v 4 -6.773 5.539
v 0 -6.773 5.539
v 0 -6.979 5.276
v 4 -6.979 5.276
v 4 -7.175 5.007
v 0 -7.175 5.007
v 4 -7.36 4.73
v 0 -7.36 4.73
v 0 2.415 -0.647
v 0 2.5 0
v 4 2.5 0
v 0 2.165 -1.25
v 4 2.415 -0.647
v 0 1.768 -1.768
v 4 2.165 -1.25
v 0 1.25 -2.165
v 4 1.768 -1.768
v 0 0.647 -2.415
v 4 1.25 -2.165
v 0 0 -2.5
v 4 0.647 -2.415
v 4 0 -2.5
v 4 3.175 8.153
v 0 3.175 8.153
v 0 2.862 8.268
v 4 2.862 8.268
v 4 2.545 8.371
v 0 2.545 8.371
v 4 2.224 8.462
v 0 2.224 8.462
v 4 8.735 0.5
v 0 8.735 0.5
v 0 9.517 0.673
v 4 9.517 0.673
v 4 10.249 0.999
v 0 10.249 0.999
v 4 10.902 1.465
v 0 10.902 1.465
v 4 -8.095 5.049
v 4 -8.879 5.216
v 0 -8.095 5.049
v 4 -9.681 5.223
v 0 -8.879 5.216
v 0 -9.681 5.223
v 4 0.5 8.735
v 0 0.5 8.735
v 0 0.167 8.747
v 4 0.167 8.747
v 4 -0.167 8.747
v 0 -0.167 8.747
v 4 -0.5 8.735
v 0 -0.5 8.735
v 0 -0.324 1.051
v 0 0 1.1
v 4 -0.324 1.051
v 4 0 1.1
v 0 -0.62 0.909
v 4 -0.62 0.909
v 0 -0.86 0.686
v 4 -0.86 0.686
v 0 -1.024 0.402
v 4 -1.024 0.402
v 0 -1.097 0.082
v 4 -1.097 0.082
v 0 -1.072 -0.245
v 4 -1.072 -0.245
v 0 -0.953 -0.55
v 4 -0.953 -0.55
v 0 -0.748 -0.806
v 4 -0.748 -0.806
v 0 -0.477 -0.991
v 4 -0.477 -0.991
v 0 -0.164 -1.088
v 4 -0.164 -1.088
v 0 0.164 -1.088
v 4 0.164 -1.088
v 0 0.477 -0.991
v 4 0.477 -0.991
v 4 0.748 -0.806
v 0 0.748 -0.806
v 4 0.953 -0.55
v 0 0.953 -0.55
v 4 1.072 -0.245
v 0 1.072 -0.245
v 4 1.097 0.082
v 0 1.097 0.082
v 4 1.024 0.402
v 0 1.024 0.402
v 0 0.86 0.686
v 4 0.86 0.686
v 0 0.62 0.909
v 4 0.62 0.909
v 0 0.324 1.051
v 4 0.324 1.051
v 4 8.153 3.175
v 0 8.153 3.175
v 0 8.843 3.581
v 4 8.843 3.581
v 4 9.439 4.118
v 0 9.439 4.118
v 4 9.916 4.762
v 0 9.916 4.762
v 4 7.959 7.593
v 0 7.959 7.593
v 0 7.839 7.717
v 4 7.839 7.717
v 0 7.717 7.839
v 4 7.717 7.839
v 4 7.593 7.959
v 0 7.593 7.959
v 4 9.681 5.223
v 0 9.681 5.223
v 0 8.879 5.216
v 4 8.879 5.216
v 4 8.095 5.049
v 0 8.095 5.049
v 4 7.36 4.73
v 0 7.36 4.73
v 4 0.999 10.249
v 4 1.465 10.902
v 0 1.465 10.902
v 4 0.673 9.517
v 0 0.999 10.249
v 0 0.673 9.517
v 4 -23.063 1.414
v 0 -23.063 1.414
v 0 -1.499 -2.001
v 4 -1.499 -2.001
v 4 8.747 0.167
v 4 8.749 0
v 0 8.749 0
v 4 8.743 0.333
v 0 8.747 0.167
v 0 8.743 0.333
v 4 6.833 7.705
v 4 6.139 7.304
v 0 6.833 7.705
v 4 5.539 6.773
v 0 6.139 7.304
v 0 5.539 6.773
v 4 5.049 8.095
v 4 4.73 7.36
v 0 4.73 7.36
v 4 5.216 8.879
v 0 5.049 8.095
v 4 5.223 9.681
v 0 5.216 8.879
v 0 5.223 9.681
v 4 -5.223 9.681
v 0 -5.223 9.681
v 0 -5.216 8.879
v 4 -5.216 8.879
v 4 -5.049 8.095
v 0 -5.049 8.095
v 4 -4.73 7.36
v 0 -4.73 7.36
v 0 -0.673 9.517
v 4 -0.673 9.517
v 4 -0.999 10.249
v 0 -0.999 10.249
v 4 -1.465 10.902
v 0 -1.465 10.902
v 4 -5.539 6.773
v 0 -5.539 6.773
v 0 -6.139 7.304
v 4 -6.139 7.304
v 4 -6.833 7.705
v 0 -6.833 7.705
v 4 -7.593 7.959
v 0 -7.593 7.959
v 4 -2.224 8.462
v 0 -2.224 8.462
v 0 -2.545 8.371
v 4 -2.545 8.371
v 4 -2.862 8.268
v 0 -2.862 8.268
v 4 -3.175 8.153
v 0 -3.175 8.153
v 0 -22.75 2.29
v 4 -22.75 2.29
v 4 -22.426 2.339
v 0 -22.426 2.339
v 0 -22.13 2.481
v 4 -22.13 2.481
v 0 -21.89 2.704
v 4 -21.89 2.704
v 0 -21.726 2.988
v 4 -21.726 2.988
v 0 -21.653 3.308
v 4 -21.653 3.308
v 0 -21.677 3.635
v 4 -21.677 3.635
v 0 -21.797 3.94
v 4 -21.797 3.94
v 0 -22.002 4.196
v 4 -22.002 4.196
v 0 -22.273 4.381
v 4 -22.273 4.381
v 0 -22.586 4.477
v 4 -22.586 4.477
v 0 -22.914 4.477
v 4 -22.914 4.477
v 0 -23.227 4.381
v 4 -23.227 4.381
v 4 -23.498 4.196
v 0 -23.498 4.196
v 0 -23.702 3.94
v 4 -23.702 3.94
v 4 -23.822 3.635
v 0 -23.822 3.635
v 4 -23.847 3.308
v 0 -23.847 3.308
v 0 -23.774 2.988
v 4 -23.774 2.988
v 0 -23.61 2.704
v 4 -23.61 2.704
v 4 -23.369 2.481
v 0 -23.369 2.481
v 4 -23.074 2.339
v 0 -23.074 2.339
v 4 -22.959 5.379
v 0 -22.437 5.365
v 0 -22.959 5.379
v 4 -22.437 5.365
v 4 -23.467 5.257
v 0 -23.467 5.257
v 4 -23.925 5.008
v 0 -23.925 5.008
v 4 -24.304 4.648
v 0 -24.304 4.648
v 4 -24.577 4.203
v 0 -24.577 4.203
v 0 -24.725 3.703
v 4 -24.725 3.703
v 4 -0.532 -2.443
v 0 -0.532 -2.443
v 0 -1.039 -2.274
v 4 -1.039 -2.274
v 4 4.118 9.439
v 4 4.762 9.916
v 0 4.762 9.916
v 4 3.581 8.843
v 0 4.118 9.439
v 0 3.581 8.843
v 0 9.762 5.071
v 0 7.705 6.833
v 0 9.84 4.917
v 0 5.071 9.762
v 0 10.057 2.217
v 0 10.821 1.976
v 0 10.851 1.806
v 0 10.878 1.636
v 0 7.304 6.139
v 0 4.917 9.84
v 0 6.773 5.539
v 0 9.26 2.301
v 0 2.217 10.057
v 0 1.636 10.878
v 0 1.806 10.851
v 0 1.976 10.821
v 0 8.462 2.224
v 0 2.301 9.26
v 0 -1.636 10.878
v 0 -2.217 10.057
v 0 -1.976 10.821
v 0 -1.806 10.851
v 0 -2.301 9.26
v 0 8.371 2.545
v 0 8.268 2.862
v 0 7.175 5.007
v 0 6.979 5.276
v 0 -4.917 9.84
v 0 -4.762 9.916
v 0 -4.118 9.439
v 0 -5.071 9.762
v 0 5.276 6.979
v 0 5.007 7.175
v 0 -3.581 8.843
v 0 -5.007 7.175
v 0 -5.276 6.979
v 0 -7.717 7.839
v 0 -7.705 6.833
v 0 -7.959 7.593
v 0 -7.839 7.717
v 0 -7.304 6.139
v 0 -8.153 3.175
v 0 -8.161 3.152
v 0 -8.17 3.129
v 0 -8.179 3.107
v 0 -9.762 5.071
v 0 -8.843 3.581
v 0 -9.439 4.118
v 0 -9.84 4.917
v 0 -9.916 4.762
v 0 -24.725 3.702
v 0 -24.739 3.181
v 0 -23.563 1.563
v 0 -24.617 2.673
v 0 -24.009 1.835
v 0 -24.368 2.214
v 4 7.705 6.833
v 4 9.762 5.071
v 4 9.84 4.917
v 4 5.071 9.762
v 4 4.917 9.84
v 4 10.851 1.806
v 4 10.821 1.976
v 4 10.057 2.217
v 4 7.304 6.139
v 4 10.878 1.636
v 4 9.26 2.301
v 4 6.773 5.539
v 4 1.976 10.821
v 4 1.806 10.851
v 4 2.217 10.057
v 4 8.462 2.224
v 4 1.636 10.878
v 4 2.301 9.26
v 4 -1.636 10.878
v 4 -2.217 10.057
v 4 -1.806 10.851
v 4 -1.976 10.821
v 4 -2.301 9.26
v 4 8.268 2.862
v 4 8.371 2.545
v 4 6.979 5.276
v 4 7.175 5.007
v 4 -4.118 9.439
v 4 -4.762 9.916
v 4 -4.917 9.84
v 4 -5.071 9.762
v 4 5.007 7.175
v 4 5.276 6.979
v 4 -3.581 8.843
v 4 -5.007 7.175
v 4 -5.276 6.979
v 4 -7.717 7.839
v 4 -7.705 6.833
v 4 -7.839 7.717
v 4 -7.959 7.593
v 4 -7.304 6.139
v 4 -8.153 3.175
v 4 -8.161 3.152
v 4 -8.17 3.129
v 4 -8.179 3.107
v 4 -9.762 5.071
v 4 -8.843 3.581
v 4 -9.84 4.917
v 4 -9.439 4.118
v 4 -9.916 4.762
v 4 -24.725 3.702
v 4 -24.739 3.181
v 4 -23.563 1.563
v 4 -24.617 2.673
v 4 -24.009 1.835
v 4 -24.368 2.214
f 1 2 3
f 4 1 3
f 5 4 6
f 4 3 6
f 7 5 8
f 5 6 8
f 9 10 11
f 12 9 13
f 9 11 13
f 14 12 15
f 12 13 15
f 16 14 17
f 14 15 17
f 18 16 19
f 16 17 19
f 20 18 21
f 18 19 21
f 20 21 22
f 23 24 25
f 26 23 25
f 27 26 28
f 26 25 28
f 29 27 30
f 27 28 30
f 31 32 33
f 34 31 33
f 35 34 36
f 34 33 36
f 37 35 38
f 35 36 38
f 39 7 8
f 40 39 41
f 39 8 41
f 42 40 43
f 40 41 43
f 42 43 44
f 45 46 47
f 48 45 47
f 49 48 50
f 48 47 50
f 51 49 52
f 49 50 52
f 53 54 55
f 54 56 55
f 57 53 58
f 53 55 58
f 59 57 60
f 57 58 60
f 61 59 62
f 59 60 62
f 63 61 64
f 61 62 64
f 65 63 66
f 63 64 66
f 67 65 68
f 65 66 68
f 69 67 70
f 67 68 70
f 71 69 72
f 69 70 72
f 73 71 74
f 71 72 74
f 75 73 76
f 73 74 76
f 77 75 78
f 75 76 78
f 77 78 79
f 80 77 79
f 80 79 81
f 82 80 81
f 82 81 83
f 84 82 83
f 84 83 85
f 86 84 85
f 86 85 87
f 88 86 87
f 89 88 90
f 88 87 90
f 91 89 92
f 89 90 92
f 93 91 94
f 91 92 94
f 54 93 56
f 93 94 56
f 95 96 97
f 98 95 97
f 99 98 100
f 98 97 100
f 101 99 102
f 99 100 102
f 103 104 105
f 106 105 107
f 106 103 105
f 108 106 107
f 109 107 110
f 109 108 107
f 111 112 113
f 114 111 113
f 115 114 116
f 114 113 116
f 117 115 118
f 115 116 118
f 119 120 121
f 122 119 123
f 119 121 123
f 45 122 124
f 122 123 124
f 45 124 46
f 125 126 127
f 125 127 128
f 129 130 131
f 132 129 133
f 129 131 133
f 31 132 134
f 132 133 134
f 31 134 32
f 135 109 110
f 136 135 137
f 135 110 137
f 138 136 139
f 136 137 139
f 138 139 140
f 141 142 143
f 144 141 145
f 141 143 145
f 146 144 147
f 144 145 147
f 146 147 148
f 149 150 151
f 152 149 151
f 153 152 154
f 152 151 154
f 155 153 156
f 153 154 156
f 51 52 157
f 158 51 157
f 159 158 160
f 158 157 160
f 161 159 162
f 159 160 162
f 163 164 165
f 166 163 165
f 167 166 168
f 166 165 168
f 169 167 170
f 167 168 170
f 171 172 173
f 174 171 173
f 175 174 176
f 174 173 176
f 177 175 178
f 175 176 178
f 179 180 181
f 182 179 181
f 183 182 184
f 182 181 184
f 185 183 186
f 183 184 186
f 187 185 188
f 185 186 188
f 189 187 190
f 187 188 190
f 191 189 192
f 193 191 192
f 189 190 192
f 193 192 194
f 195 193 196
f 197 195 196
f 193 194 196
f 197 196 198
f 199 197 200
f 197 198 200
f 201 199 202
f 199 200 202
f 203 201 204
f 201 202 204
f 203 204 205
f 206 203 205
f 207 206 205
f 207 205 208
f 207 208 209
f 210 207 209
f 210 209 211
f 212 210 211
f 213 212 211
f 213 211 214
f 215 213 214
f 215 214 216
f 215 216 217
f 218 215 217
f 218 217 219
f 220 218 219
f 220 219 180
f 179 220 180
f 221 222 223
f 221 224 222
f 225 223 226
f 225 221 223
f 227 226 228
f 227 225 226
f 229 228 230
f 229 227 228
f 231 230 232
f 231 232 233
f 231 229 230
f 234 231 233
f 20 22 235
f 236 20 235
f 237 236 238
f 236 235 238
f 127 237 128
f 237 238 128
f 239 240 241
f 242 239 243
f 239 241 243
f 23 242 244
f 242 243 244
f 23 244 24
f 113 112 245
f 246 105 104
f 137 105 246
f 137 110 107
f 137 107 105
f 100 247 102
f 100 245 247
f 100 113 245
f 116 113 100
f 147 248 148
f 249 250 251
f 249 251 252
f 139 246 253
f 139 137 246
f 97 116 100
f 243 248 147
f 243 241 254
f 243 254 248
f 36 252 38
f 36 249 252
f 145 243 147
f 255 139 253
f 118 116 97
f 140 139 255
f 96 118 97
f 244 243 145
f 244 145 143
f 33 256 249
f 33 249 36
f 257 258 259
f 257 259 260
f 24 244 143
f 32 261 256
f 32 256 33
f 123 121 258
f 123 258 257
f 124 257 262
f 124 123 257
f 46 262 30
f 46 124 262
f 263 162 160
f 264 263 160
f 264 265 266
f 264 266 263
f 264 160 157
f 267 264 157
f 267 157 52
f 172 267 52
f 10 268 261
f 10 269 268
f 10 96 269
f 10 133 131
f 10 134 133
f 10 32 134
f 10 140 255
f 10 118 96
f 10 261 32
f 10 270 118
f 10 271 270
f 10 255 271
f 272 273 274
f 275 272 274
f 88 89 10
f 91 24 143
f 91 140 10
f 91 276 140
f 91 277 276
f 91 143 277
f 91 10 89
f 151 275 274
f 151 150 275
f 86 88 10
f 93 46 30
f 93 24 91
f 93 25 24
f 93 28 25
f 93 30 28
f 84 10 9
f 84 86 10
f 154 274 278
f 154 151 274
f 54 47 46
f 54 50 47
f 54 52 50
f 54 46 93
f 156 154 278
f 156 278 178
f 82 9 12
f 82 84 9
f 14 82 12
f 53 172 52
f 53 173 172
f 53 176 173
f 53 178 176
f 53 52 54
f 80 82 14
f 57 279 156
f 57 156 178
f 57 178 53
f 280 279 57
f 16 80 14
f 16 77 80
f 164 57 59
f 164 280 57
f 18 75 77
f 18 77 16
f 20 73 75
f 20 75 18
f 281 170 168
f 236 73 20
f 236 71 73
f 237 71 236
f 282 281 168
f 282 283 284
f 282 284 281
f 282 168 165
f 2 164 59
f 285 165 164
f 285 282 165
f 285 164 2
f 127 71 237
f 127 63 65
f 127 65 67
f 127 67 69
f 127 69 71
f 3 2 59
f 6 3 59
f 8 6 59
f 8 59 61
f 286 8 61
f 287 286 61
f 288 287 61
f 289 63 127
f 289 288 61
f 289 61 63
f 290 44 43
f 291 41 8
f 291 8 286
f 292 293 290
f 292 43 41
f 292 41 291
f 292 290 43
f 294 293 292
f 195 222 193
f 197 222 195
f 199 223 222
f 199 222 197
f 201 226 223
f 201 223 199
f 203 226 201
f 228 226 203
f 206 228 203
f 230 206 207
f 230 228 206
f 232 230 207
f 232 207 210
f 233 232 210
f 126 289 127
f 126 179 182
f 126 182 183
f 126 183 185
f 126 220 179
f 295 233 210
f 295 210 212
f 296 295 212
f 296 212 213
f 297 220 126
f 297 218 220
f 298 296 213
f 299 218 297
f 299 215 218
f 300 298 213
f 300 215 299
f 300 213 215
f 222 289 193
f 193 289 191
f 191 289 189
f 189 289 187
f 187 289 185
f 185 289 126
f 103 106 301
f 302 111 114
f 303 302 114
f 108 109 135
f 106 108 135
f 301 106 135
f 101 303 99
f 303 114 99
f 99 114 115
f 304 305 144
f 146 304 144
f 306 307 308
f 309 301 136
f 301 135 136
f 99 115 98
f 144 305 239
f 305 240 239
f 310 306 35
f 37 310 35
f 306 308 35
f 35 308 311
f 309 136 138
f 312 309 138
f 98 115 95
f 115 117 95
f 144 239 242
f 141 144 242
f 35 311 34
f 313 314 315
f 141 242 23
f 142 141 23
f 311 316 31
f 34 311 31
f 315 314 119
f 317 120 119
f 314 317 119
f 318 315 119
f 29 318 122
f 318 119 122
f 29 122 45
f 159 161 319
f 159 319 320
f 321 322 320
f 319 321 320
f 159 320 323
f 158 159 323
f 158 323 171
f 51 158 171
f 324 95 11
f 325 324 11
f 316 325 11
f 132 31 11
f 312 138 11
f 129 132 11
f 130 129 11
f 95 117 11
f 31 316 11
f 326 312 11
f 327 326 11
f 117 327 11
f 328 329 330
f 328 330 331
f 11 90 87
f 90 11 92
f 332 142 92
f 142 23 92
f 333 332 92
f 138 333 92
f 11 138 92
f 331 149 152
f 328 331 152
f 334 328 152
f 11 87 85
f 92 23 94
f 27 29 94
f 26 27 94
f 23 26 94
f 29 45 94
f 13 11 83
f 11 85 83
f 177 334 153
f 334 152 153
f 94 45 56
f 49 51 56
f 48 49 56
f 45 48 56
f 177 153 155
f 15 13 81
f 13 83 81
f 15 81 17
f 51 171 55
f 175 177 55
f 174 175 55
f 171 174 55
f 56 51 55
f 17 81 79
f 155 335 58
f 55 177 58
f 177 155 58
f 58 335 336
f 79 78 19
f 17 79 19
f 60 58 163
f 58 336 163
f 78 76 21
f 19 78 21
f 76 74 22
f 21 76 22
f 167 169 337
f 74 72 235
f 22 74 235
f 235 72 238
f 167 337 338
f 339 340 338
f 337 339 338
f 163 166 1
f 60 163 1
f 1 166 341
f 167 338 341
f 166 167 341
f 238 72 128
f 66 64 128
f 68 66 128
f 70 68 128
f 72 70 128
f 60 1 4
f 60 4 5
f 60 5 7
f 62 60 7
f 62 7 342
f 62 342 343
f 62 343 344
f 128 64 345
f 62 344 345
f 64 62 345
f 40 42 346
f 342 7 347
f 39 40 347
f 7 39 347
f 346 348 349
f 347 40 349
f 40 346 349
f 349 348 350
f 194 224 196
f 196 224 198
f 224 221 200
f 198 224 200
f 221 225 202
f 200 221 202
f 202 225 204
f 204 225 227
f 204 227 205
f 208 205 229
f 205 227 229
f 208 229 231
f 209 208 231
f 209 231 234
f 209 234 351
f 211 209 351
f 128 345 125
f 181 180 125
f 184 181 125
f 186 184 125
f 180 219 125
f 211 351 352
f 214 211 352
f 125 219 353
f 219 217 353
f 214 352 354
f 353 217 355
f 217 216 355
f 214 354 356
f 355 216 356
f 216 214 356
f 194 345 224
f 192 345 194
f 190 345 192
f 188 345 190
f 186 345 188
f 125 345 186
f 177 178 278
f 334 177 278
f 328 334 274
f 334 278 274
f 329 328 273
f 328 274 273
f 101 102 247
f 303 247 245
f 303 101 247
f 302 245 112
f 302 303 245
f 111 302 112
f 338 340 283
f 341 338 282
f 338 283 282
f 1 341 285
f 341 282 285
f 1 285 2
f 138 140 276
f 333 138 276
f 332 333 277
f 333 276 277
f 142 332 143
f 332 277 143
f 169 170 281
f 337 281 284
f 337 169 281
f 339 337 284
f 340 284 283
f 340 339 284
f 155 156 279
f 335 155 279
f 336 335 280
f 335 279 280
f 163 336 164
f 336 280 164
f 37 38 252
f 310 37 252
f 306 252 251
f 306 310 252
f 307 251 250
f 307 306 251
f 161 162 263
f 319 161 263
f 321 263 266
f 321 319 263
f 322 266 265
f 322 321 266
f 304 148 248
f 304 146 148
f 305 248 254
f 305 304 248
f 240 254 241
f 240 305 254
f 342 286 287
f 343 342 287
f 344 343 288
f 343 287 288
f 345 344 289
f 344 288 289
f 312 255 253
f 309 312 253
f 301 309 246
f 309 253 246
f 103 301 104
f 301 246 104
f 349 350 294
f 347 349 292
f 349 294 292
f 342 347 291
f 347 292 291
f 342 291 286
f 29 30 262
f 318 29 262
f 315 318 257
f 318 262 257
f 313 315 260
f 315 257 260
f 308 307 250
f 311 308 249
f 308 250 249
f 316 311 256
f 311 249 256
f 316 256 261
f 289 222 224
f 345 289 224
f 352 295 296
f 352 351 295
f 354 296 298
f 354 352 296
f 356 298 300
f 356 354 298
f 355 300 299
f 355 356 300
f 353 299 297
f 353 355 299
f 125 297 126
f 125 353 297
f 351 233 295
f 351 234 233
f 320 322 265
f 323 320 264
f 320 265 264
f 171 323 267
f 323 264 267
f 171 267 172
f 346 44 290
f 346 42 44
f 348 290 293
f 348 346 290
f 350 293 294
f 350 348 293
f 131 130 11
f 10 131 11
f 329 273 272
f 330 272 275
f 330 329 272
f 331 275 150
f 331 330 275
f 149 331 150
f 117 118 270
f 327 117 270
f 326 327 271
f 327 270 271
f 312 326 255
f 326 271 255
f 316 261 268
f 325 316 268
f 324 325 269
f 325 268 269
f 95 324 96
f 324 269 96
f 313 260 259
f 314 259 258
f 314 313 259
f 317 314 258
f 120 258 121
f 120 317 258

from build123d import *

# Parameters (mm, degrees)
BASPROSKE_W         = 4
BASPROSKE_H         = 11
TOOTHCUT_DEPTH      = 17.062378404
TEETHCUTS_COUNT     = 20
TEETHCUTS_ANGLE     = 342
BORSKE_R            = 1.1
BORE_DEPTH          = 50.0000508
CUT_EXTRUDE_1_DEPTH = 10
EXTRUDE_1_REACH     = 38.494
SKETCH_6_W          = 4
SKETCH_6_H          = 4
FILLET_1_R          = 2
SKETCH_7_R          = 1.1
CUT_EXTRUDE_2_DEPTH = 10


with BuildPart() as part:
    # BasProSke → Base-Revolve (revolve)
    with BuildSketch(Plane(origin=(0, 0, 0), x_dir=(1, 0, 0), z_dir=(0, 1, 0)), mode=Mode.PRIVATE) as base_revolve_sk:
        with Locations((2, 5.5)):
            Rectangle(BASPROSKE_W, BASPROSKE_H)
    revolve(base_revolve_sk.sketch.rotate(Axis((-10, 0, 0), (1, 0, 0)), 180), axis=Axis((-10, 0, 0), (1, 0, 0)))

    # TooCutSke → ToothCut (cut, through all)
    with BuildSketch(Plane(origin=(0, 0, 0), x_dir=(0, 0, -1), z_dir=(1, 0, 0))):
        with BuildLine():
            ThreePointArc((0.499924007, 8.734705318), (0, 8.749), (-0.499924007, 8.734705318))
            ThreePointArc((-0.499924007, 8.734705318), (-0.824302243, 9.905497836), (-1.485192705, 10.924909509))
            ThreePointArc((-1.485192705, 10.924909509), (0, 11.0254), (1.485192705, 10.924909509))
            ThreePointArc((1.485192705, 10.924909509), (0.824302243, 9.905497836), (0.499924007, 8.734705318))
        make_face()
    toothcut = extrude(amount=TOOTHCUT_DEPTH, mode=Mode.SUBTRACT)

    # TeethCuts: ToothCut ×20 about axis
    teethcuts_axis = Axis((-10, 0, 0), (1, 0, 0))
    for i in range(1, TEETHCUTS_COUNT):
        add(toothcut.rotate(teethcuts_axis, i * TEETHCUTS_ANGLE / (TEETHCUTS_COUNT - 1)), mode=Mode.SUBTRACT)

    # BorSke → Bore (cut, symmetric)
    with BuildSketch(Plane(origin=(0, 0, 0), x_dir=(0, 0, -1), z_dir=(1, 0, 0))):
        with Locations(Location((0, 0, 0), (0, 0, 180))):
            Circle(BORSKE_R)
    extrude(amount=BORE_DEPTH, both=True, mode=Mode.SUBTRACT)

    # 草图1 → 切除-拉伸1 (cut)
    with BuildSketch(Plane(origin=(4, 0, 0), x_dir=(0, 0, -1), z_dir=(1, 0, 0))):
        with BuildLine():
            Line((0, 12.401538845), (0, 2.5))
            ThreePointArc((0, 2.5), (1.767766953, 1.767766953), (2.5, 0))
            ThreePointArc((2.5, 0), (1.767766953, -1.767766953), (0, -2.5))
            Line((0, -2.5), (0, -15.030002789))
            Line((0, -15.030002789), (15.193341894, -15.030002789))
            Line((15.193341894, -15.030002789), (15.193341894, 12.401538845))
            Line((15.193341894, 12.401538845), (0, 12.401538845))
        make_face()
    extrude(amount=-CUT_EXTRUDE_1_DEPTH, mode=Mode.SUBTRACT)

    # 草图6 → 凸台-拉伸1 (add, up to next)
    with BuildSketch(Plane(origin=(0, -24.692208515, 3.910861626), x_dir=(0, -0.1564344650402271, -0.9876883405951383), z_dir=(0, -0.9876883405951383, 0.1564344650402271)), mode=Mode.PRIVATE) as extrude_1_sk1:
        with Locations((0.210861626, 2)):
            Rectangle(SKETCH_6_W, SKETCH_6_H)
    extrude_1_tool1 = extrude(extrude_1_sk1.sketch, amount=-EXTRUDE_1_REACH, mode=Mode.PRIVATE) - part.part
    add(extrude_1_tool1.solids().sort_by_distance((2, -24.725195, 3.702596))[0])

    # 圆角1
    fillet_1_edges = [part.edges().sort_by_distance(p)[0] for p in [
        (2, -24.41232561, 5.677972738),
        (2, -25.038063471, 1.727219375),
    ]]
    fillet(fillet_1_edges, radius=FILLET_1_R - 0.0001)  # a hair under: the kernel refuses the full size

    # 草图7 → 切除-拉伸2 (cut)
    with BuildSketch(Plane(origin=(4, 0, 0), x_dir=(0, 0, -1), z_dir=(1, 0, 0))):
        with Locations((-3.389727126, -22.749817859)):
            Circle(SKETCH_7_R)
    extrude(amount=-CUT_EXTRUDE_2_DEPTH, mode=Mode.SUBTRACT)


solid = part.part
